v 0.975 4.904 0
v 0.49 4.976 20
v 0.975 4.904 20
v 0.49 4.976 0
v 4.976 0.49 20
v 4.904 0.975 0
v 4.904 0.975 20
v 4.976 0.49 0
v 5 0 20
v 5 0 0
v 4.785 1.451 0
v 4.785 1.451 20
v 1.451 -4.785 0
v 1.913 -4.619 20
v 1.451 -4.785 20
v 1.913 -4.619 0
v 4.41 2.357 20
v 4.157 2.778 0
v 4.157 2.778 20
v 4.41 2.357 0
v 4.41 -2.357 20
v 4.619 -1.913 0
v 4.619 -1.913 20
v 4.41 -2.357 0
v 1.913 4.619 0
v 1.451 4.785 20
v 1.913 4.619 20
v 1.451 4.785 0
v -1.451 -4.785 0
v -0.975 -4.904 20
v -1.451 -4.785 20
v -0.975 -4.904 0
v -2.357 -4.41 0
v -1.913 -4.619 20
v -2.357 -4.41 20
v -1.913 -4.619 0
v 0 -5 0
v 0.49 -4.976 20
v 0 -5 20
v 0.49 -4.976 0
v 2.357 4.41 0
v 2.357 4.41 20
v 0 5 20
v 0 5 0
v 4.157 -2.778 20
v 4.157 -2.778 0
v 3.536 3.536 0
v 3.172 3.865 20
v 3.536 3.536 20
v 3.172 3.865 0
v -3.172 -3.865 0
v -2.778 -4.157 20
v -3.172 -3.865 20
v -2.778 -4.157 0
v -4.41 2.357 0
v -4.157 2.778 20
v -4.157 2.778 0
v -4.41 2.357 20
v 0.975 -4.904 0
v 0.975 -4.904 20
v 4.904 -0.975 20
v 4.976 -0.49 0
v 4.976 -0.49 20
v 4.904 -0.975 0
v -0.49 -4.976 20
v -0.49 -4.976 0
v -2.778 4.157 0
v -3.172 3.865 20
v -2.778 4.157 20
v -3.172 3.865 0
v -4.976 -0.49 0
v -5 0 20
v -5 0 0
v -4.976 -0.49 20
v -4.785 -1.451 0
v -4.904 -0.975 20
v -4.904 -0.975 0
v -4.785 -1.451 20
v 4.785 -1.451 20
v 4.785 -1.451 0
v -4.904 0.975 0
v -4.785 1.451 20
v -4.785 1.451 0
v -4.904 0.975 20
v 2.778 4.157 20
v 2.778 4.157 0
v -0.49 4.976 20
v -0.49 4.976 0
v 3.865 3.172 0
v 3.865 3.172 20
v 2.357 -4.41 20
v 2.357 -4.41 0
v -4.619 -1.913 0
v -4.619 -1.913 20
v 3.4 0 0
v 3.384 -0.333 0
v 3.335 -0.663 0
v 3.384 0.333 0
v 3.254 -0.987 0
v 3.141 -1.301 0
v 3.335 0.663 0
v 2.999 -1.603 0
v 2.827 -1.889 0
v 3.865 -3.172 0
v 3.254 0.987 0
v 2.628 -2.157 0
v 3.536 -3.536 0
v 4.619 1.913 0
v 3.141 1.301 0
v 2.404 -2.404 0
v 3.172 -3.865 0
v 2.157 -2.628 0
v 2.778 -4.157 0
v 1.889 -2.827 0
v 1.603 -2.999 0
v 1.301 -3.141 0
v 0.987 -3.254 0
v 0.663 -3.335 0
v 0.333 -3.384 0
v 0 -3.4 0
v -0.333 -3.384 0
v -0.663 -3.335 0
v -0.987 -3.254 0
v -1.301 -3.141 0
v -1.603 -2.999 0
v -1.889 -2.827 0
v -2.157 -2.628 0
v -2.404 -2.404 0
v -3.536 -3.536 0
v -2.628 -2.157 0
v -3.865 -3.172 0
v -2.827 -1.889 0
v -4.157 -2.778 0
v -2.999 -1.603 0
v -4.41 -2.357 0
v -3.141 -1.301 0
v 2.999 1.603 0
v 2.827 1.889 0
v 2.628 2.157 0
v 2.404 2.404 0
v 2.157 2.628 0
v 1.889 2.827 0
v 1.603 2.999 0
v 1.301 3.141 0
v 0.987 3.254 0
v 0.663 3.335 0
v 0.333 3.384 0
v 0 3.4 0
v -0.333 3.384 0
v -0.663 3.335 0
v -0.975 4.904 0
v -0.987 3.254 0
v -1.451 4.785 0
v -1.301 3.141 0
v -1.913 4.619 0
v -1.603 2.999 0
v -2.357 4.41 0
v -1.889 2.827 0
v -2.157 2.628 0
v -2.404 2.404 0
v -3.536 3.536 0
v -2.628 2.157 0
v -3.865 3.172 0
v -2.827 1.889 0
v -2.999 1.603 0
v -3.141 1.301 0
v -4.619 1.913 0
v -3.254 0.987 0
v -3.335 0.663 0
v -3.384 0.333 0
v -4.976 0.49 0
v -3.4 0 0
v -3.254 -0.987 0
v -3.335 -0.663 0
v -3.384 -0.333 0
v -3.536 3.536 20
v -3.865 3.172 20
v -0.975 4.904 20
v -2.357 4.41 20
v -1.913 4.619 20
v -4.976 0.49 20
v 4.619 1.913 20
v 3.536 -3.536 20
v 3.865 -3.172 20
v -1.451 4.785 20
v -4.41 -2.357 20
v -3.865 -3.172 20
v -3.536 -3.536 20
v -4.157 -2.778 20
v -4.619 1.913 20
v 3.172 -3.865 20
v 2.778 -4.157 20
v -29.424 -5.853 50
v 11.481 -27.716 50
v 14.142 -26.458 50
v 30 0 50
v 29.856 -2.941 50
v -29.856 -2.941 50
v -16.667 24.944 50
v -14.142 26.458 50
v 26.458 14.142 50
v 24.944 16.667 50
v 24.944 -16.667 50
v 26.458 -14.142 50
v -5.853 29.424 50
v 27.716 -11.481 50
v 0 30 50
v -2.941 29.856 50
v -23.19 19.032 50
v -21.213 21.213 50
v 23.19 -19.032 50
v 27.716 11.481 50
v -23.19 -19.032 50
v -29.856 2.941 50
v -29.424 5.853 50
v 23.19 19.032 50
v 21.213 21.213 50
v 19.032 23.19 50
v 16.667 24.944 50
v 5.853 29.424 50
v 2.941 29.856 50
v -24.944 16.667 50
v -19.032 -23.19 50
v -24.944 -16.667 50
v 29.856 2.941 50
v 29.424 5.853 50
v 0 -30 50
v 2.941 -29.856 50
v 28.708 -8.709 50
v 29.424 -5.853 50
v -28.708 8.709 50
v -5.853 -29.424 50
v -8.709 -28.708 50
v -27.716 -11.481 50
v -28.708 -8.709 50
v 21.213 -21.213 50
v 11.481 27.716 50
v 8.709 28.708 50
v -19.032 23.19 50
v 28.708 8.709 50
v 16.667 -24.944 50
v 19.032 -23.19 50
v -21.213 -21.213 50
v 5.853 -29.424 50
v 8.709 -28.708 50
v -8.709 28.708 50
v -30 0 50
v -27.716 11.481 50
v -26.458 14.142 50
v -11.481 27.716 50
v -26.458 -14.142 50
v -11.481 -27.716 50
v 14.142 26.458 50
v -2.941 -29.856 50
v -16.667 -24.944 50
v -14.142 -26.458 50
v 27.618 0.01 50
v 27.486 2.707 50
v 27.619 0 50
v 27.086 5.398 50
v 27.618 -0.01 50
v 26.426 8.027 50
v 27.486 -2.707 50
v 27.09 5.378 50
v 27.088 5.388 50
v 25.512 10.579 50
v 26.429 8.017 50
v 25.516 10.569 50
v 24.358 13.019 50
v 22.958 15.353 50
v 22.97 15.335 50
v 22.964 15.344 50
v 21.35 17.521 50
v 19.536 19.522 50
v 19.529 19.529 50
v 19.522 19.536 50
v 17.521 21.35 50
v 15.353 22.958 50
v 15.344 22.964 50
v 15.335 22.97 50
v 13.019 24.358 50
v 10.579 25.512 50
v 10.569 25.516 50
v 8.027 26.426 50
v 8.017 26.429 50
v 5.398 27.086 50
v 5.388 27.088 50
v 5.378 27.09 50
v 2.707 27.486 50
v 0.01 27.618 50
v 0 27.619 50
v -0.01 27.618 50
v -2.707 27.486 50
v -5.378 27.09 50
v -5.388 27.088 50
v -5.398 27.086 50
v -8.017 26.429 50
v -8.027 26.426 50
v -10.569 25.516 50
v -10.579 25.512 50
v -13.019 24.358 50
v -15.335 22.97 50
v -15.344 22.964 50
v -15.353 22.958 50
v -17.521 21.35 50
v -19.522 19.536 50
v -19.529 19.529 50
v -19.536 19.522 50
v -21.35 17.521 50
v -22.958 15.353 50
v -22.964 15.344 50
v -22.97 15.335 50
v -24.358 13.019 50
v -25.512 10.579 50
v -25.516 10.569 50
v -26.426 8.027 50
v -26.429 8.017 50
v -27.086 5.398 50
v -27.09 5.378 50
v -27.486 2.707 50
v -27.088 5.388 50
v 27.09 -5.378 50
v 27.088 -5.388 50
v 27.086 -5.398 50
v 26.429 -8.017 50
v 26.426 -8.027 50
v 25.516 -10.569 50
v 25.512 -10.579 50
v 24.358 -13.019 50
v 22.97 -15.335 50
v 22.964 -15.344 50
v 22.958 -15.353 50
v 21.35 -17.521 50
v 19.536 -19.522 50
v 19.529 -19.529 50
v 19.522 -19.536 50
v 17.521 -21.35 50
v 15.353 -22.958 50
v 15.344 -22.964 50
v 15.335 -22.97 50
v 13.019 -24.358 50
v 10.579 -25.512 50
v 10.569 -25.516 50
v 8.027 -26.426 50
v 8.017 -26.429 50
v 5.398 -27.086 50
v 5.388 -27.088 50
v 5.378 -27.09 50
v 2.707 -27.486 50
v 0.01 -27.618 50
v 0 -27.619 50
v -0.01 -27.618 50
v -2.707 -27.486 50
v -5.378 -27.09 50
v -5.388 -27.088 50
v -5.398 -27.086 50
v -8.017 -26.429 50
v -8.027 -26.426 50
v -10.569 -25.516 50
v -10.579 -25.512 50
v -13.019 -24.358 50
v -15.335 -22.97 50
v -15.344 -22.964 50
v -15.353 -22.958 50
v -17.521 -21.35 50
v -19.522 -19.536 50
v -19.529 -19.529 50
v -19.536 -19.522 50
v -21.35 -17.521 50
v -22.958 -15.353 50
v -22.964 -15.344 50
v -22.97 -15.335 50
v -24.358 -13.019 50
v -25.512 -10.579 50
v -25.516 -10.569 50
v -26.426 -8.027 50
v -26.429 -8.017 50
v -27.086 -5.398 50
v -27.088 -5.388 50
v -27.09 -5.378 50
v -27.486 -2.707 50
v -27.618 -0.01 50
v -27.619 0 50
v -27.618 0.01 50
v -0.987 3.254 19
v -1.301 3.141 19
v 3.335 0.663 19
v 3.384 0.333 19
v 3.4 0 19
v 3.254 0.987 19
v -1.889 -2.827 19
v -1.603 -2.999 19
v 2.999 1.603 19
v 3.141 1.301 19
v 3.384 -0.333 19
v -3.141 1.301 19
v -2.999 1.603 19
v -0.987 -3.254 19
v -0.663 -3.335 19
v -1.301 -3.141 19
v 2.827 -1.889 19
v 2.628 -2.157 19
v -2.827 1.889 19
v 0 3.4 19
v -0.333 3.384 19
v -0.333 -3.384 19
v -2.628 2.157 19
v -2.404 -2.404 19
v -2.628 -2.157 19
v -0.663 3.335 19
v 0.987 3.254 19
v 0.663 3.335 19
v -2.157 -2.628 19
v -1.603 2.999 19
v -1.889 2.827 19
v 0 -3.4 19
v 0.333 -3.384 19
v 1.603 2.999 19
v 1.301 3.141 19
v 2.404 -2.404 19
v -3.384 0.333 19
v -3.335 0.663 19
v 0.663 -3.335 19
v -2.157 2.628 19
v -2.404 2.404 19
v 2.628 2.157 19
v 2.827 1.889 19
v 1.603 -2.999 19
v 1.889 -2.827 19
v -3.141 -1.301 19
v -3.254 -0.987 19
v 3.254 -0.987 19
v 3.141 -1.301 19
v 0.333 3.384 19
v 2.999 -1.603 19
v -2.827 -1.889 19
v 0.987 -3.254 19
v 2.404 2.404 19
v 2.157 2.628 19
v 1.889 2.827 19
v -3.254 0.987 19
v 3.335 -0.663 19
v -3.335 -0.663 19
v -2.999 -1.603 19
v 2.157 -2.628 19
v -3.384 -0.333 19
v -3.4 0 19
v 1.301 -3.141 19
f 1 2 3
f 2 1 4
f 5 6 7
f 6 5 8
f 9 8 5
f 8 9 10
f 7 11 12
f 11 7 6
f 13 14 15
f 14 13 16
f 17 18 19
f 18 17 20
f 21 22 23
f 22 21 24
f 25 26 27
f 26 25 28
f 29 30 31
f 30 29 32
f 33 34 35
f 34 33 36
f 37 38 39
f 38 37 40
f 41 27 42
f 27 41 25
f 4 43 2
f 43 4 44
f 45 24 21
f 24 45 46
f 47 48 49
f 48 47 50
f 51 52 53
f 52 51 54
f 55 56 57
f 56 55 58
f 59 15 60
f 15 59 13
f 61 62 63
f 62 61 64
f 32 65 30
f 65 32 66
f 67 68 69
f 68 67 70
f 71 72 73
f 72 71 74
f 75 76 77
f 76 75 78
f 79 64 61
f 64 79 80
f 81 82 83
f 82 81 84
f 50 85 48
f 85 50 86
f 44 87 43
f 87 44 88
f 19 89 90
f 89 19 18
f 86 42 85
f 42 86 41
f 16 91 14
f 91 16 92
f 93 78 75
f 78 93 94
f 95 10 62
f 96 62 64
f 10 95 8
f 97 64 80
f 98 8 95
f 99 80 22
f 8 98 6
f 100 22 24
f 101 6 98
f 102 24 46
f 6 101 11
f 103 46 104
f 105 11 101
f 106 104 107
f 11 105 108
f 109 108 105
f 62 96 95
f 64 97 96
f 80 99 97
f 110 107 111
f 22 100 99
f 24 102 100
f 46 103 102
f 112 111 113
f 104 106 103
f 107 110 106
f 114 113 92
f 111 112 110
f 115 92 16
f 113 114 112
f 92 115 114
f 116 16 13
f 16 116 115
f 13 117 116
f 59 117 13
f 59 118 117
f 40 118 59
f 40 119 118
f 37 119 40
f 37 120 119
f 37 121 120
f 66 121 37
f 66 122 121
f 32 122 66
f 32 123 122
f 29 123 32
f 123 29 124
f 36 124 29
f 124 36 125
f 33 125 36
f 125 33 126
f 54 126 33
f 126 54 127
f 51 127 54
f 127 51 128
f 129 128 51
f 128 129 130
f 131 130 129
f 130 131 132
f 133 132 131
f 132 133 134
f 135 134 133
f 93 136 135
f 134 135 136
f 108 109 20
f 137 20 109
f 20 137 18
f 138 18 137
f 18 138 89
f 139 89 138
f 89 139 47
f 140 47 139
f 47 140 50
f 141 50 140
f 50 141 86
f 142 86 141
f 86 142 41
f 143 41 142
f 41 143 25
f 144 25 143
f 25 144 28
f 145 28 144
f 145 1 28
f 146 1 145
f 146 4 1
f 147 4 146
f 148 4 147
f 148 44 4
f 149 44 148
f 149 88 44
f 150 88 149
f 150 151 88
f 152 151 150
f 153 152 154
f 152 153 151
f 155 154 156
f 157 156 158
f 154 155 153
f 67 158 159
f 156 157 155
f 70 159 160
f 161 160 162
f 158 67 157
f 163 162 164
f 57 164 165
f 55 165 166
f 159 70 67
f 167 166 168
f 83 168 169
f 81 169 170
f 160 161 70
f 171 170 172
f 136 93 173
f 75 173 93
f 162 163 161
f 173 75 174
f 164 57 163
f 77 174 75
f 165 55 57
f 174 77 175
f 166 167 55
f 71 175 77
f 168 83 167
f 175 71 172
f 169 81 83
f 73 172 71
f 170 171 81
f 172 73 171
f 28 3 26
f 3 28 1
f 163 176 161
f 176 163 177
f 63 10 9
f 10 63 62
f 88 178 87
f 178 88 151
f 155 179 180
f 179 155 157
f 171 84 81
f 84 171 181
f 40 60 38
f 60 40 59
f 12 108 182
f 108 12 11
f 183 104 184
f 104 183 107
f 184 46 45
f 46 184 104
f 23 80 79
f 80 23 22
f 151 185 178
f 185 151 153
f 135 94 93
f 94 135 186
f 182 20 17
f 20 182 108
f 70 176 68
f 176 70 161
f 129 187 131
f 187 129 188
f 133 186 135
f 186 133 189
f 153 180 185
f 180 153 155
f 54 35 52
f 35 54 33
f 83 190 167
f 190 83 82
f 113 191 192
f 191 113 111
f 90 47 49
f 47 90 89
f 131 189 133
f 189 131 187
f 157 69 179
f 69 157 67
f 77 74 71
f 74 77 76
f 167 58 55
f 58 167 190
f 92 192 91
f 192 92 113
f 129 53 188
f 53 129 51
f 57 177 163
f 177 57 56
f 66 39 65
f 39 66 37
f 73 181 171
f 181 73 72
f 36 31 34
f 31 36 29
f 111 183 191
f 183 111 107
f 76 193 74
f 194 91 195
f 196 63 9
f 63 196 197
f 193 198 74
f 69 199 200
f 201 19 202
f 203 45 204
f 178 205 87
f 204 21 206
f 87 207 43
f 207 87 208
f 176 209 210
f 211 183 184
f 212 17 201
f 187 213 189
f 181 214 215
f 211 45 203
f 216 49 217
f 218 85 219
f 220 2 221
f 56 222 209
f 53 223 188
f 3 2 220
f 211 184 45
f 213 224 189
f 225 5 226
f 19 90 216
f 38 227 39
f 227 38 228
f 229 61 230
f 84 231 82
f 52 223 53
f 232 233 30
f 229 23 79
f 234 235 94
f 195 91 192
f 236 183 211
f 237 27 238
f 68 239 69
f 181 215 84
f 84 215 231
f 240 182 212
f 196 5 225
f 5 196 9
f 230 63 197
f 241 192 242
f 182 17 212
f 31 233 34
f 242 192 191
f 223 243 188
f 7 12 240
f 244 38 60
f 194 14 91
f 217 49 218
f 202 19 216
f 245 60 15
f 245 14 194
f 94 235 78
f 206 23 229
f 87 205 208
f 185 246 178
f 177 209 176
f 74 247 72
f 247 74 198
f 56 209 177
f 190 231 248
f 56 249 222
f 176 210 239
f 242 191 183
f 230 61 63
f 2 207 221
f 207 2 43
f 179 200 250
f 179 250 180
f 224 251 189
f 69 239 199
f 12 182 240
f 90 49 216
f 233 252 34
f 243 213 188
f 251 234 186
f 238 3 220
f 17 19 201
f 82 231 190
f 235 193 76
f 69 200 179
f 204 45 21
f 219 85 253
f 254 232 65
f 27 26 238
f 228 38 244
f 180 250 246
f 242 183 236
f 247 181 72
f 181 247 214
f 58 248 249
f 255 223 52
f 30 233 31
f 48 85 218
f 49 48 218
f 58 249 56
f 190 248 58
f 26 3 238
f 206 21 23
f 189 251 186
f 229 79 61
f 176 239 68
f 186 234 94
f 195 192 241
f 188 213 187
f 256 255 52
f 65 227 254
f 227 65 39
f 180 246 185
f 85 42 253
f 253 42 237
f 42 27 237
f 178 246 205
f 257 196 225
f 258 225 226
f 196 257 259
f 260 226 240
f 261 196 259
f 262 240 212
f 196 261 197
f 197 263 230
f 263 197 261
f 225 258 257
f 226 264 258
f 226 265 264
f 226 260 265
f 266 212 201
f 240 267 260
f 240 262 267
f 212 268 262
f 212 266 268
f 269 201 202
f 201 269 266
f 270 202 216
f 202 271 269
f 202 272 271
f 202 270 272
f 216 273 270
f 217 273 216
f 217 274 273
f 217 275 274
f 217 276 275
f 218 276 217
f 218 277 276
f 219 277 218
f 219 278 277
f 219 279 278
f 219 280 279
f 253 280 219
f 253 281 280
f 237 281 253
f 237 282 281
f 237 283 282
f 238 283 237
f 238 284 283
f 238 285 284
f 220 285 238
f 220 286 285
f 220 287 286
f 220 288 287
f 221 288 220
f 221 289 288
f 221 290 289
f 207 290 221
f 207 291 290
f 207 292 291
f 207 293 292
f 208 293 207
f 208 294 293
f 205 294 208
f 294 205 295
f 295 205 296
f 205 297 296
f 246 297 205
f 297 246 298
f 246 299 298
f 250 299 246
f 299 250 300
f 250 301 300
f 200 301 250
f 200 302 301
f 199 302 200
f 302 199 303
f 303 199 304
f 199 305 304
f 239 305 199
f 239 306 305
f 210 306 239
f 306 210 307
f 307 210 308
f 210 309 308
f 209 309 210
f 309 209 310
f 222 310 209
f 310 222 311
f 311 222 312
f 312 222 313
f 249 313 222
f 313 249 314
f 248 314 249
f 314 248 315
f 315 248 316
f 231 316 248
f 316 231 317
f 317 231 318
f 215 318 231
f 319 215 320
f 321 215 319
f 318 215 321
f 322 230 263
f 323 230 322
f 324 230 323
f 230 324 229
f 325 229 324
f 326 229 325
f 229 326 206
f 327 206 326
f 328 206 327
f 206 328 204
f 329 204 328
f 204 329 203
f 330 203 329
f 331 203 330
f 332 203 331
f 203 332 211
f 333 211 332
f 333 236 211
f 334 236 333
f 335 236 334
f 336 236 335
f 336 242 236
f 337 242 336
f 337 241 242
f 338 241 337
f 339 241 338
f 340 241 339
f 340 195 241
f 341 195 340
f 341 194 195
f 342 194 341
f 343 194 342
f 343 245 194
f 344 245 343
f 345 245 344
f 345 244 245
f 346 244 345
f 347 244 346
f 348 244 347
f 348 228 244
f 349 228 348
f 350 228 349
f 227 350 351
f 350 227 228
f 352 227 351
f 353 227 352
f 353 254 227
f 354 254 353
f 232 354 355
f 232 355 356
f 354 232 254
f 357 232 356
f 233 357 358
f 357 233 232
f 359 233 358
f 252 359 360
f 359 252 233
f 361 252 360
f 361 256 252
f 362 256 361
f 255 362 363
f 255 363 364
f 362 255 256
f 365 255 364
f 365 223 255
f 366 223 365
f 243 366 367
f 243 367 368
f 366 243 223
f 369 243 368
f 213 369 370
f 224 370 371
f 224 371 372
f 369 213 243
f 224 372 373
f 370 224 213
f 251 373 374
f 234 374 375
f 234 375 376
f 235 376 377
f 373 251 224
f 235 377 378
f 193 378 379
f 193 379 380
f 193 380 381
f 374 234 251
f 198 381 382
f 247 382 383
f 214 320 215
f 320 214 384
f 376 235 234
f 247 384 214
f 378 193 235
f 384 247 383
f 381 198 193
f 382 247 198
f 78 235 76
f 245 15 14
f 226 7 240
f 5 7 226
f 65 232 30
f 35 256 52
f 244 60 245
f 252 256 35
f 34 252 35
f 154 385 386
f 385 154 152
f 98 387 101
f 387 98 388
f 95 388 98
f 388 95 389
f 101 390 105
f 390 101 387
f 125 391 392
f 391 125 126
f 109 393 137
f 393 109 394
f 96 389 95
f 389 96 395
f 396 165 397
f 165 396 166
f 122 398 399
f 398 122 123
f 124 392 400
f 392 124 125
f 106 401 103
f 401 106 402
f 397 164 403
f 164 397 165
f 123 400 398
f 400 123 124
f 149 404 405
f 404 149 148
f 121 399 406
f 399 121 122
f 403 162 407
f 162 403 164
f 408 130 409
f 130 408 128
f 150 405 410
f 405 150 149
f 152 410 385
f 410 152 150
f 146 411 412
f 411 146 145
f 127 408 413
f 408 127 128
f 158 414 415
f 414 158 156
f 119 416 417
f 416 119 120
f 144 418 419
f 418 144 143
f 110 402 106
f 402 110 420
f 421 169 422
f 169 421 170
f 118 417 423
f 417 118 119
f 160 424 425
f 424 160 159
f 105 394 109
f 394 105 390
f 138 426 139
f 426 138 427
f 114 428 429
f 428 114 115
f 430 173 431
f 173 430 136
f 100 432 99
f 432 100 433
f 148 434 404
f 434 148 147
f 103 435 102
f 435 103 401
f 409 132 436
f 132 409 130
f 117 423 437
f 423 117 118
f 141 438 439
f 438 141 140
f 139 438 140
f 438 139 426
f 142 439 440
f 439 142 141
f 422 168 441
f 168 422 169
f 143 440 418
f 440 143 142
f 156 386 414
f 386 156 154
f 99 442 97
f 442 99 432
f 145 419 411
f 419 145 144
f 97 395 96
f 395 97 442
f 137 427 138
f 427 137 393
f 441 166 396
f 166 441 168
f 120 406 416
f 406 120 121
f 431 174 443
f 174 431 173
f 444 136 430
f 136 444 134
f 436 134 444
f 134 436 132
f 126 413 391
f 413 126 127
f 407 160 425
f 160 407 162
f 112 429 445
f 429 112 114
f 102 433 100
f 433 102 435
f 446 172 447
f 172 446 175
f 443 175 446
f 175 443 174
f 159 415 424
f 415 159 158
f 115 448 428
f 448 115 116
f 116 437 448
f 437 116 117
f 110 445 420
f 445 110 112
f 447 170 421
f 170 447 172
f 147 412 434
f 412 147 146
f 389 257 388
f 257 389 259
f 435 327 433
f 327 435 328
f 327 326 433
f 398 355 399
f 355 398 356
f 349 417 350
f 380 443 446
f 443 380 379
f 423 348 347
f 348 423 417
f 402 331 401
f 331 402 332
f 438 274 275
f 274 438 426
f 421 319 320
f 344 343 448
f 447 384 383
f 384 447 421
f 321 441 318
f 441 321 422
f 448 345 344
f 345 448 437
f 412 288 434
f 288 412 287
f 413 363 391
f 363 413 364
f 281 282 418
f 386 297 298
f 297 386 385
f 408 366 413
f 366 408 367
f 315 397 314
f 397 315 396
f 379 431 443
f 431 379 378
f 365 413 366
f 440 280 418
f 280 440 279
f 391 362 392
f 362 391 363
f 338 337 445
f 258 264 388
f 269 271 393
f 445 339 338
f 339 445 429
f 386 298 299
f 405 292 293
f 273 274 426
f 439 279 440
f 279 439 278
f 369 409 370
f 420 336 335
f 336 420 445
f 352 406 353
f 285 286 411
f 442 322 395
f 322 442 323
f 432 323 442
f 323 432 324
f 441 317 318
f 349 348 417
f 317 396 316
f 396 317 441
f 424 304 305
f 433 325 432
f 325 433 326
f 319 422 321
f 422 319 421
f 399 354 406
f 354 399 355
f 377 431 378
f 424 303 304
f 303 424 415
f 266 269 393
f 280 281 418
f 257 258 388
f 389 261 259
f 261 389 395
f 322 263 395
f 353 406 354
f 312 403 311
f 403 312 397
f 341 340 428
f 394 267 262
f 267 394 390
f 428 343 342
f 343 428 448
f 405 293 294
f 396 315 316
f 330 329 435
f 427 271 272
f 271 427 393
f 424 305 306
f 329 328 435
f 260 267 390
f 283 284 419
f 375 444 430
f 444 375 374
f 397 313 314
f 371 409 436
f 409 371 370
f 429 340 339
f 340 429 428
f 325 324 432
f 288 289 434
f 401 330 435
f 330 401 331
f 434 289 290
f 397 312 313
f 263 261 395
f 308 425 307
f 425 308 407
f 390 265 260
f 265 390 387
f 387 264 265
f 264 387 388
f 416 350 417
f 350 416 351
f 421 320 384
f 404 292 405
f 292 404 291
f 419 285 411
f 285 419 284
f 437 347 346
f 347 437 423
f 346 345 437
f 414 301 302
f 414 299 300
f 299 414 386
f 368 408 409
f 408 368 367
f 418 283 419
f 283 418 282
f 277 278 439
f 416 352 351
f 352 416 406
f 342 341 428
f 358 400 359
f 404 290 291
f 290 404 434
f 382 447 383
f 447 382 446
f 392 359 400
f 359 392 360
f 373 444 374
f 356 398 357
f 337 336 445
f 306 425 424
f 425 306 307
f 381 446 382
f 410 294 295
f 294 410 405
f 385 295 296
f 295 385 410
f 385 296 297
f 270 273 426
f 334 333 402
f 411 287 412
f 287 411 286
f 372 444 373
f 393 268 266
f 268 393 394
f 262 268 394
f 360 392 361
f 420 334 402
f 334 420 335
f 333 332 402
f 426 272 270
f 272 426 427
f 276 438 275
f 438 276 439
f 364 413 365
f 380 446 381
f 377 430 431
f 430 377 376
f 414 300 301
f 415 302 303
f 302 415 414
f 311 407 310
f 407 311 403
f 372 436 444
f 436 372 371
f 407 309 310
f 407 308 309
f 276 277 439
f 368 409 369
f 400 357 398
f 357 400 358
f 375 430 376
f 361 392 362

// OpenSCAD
// Lab Funnel - A straight spout tube with a conical funnel on top.
// Printed upright with the wide opening at the top.
// Spout: 10mm OD, 20mm long. Funnel: widens from 10mm to 60mm OD over 30mm height.
// Wall thickness: 1.6mm everywhere.

$fn = 64;

// Dimensions
spout_od      = 10;
spout_id      = spout_od - 2 * 1.6; // 6.8
spout_height  = 20;
funnel_start_od = spout_od;
funnel_end_od   = 60;
funnel_height   = 50 - spout_height; // 30

// Build the part from the bottom (z=0) upwards.
// We use a difference operation to cut the inner bore from a solid outer shell.

difference() {
    // 1. Outer Shell
    union() {
        // Spout section (cylinder)
        cylinder(h = spout_height, d = spout_od);
        
        // Funnel section (cone)
        // Cone starts at z = spout_height with d = funnel_start_od
        // Cone ends at z = 50 with d = funnel_end_od
        translate([0, 0, spout_height]) 
            cylinder(h = funnel_height, d1 = funnel_start_od, d2 = funnel_end_od);
    }
    
    // 2. Inner Bore (cutting shapes)
    // We extend the cutting cylinders slightly past the faces to ensure clean cuts.
    
    // Spout bore
    translate([0, 0, -1]) 
        cylinder(h = spout_height + 2, d = spout_id);
        
    // Funnel bore (cone)
    // Inverted cone: wide at bottom (z=spout_height), narrow at top (z=50)
    // d1 is at the start of the cone (z=spout_height), d2 is at the end (z=50)
    translate([0, 0, spout_height - 1]) 
        cylinder(h = funnel_height + 2, d1 = spout_id, d2 = funnel_end_od - 2 * 1.6);
}
